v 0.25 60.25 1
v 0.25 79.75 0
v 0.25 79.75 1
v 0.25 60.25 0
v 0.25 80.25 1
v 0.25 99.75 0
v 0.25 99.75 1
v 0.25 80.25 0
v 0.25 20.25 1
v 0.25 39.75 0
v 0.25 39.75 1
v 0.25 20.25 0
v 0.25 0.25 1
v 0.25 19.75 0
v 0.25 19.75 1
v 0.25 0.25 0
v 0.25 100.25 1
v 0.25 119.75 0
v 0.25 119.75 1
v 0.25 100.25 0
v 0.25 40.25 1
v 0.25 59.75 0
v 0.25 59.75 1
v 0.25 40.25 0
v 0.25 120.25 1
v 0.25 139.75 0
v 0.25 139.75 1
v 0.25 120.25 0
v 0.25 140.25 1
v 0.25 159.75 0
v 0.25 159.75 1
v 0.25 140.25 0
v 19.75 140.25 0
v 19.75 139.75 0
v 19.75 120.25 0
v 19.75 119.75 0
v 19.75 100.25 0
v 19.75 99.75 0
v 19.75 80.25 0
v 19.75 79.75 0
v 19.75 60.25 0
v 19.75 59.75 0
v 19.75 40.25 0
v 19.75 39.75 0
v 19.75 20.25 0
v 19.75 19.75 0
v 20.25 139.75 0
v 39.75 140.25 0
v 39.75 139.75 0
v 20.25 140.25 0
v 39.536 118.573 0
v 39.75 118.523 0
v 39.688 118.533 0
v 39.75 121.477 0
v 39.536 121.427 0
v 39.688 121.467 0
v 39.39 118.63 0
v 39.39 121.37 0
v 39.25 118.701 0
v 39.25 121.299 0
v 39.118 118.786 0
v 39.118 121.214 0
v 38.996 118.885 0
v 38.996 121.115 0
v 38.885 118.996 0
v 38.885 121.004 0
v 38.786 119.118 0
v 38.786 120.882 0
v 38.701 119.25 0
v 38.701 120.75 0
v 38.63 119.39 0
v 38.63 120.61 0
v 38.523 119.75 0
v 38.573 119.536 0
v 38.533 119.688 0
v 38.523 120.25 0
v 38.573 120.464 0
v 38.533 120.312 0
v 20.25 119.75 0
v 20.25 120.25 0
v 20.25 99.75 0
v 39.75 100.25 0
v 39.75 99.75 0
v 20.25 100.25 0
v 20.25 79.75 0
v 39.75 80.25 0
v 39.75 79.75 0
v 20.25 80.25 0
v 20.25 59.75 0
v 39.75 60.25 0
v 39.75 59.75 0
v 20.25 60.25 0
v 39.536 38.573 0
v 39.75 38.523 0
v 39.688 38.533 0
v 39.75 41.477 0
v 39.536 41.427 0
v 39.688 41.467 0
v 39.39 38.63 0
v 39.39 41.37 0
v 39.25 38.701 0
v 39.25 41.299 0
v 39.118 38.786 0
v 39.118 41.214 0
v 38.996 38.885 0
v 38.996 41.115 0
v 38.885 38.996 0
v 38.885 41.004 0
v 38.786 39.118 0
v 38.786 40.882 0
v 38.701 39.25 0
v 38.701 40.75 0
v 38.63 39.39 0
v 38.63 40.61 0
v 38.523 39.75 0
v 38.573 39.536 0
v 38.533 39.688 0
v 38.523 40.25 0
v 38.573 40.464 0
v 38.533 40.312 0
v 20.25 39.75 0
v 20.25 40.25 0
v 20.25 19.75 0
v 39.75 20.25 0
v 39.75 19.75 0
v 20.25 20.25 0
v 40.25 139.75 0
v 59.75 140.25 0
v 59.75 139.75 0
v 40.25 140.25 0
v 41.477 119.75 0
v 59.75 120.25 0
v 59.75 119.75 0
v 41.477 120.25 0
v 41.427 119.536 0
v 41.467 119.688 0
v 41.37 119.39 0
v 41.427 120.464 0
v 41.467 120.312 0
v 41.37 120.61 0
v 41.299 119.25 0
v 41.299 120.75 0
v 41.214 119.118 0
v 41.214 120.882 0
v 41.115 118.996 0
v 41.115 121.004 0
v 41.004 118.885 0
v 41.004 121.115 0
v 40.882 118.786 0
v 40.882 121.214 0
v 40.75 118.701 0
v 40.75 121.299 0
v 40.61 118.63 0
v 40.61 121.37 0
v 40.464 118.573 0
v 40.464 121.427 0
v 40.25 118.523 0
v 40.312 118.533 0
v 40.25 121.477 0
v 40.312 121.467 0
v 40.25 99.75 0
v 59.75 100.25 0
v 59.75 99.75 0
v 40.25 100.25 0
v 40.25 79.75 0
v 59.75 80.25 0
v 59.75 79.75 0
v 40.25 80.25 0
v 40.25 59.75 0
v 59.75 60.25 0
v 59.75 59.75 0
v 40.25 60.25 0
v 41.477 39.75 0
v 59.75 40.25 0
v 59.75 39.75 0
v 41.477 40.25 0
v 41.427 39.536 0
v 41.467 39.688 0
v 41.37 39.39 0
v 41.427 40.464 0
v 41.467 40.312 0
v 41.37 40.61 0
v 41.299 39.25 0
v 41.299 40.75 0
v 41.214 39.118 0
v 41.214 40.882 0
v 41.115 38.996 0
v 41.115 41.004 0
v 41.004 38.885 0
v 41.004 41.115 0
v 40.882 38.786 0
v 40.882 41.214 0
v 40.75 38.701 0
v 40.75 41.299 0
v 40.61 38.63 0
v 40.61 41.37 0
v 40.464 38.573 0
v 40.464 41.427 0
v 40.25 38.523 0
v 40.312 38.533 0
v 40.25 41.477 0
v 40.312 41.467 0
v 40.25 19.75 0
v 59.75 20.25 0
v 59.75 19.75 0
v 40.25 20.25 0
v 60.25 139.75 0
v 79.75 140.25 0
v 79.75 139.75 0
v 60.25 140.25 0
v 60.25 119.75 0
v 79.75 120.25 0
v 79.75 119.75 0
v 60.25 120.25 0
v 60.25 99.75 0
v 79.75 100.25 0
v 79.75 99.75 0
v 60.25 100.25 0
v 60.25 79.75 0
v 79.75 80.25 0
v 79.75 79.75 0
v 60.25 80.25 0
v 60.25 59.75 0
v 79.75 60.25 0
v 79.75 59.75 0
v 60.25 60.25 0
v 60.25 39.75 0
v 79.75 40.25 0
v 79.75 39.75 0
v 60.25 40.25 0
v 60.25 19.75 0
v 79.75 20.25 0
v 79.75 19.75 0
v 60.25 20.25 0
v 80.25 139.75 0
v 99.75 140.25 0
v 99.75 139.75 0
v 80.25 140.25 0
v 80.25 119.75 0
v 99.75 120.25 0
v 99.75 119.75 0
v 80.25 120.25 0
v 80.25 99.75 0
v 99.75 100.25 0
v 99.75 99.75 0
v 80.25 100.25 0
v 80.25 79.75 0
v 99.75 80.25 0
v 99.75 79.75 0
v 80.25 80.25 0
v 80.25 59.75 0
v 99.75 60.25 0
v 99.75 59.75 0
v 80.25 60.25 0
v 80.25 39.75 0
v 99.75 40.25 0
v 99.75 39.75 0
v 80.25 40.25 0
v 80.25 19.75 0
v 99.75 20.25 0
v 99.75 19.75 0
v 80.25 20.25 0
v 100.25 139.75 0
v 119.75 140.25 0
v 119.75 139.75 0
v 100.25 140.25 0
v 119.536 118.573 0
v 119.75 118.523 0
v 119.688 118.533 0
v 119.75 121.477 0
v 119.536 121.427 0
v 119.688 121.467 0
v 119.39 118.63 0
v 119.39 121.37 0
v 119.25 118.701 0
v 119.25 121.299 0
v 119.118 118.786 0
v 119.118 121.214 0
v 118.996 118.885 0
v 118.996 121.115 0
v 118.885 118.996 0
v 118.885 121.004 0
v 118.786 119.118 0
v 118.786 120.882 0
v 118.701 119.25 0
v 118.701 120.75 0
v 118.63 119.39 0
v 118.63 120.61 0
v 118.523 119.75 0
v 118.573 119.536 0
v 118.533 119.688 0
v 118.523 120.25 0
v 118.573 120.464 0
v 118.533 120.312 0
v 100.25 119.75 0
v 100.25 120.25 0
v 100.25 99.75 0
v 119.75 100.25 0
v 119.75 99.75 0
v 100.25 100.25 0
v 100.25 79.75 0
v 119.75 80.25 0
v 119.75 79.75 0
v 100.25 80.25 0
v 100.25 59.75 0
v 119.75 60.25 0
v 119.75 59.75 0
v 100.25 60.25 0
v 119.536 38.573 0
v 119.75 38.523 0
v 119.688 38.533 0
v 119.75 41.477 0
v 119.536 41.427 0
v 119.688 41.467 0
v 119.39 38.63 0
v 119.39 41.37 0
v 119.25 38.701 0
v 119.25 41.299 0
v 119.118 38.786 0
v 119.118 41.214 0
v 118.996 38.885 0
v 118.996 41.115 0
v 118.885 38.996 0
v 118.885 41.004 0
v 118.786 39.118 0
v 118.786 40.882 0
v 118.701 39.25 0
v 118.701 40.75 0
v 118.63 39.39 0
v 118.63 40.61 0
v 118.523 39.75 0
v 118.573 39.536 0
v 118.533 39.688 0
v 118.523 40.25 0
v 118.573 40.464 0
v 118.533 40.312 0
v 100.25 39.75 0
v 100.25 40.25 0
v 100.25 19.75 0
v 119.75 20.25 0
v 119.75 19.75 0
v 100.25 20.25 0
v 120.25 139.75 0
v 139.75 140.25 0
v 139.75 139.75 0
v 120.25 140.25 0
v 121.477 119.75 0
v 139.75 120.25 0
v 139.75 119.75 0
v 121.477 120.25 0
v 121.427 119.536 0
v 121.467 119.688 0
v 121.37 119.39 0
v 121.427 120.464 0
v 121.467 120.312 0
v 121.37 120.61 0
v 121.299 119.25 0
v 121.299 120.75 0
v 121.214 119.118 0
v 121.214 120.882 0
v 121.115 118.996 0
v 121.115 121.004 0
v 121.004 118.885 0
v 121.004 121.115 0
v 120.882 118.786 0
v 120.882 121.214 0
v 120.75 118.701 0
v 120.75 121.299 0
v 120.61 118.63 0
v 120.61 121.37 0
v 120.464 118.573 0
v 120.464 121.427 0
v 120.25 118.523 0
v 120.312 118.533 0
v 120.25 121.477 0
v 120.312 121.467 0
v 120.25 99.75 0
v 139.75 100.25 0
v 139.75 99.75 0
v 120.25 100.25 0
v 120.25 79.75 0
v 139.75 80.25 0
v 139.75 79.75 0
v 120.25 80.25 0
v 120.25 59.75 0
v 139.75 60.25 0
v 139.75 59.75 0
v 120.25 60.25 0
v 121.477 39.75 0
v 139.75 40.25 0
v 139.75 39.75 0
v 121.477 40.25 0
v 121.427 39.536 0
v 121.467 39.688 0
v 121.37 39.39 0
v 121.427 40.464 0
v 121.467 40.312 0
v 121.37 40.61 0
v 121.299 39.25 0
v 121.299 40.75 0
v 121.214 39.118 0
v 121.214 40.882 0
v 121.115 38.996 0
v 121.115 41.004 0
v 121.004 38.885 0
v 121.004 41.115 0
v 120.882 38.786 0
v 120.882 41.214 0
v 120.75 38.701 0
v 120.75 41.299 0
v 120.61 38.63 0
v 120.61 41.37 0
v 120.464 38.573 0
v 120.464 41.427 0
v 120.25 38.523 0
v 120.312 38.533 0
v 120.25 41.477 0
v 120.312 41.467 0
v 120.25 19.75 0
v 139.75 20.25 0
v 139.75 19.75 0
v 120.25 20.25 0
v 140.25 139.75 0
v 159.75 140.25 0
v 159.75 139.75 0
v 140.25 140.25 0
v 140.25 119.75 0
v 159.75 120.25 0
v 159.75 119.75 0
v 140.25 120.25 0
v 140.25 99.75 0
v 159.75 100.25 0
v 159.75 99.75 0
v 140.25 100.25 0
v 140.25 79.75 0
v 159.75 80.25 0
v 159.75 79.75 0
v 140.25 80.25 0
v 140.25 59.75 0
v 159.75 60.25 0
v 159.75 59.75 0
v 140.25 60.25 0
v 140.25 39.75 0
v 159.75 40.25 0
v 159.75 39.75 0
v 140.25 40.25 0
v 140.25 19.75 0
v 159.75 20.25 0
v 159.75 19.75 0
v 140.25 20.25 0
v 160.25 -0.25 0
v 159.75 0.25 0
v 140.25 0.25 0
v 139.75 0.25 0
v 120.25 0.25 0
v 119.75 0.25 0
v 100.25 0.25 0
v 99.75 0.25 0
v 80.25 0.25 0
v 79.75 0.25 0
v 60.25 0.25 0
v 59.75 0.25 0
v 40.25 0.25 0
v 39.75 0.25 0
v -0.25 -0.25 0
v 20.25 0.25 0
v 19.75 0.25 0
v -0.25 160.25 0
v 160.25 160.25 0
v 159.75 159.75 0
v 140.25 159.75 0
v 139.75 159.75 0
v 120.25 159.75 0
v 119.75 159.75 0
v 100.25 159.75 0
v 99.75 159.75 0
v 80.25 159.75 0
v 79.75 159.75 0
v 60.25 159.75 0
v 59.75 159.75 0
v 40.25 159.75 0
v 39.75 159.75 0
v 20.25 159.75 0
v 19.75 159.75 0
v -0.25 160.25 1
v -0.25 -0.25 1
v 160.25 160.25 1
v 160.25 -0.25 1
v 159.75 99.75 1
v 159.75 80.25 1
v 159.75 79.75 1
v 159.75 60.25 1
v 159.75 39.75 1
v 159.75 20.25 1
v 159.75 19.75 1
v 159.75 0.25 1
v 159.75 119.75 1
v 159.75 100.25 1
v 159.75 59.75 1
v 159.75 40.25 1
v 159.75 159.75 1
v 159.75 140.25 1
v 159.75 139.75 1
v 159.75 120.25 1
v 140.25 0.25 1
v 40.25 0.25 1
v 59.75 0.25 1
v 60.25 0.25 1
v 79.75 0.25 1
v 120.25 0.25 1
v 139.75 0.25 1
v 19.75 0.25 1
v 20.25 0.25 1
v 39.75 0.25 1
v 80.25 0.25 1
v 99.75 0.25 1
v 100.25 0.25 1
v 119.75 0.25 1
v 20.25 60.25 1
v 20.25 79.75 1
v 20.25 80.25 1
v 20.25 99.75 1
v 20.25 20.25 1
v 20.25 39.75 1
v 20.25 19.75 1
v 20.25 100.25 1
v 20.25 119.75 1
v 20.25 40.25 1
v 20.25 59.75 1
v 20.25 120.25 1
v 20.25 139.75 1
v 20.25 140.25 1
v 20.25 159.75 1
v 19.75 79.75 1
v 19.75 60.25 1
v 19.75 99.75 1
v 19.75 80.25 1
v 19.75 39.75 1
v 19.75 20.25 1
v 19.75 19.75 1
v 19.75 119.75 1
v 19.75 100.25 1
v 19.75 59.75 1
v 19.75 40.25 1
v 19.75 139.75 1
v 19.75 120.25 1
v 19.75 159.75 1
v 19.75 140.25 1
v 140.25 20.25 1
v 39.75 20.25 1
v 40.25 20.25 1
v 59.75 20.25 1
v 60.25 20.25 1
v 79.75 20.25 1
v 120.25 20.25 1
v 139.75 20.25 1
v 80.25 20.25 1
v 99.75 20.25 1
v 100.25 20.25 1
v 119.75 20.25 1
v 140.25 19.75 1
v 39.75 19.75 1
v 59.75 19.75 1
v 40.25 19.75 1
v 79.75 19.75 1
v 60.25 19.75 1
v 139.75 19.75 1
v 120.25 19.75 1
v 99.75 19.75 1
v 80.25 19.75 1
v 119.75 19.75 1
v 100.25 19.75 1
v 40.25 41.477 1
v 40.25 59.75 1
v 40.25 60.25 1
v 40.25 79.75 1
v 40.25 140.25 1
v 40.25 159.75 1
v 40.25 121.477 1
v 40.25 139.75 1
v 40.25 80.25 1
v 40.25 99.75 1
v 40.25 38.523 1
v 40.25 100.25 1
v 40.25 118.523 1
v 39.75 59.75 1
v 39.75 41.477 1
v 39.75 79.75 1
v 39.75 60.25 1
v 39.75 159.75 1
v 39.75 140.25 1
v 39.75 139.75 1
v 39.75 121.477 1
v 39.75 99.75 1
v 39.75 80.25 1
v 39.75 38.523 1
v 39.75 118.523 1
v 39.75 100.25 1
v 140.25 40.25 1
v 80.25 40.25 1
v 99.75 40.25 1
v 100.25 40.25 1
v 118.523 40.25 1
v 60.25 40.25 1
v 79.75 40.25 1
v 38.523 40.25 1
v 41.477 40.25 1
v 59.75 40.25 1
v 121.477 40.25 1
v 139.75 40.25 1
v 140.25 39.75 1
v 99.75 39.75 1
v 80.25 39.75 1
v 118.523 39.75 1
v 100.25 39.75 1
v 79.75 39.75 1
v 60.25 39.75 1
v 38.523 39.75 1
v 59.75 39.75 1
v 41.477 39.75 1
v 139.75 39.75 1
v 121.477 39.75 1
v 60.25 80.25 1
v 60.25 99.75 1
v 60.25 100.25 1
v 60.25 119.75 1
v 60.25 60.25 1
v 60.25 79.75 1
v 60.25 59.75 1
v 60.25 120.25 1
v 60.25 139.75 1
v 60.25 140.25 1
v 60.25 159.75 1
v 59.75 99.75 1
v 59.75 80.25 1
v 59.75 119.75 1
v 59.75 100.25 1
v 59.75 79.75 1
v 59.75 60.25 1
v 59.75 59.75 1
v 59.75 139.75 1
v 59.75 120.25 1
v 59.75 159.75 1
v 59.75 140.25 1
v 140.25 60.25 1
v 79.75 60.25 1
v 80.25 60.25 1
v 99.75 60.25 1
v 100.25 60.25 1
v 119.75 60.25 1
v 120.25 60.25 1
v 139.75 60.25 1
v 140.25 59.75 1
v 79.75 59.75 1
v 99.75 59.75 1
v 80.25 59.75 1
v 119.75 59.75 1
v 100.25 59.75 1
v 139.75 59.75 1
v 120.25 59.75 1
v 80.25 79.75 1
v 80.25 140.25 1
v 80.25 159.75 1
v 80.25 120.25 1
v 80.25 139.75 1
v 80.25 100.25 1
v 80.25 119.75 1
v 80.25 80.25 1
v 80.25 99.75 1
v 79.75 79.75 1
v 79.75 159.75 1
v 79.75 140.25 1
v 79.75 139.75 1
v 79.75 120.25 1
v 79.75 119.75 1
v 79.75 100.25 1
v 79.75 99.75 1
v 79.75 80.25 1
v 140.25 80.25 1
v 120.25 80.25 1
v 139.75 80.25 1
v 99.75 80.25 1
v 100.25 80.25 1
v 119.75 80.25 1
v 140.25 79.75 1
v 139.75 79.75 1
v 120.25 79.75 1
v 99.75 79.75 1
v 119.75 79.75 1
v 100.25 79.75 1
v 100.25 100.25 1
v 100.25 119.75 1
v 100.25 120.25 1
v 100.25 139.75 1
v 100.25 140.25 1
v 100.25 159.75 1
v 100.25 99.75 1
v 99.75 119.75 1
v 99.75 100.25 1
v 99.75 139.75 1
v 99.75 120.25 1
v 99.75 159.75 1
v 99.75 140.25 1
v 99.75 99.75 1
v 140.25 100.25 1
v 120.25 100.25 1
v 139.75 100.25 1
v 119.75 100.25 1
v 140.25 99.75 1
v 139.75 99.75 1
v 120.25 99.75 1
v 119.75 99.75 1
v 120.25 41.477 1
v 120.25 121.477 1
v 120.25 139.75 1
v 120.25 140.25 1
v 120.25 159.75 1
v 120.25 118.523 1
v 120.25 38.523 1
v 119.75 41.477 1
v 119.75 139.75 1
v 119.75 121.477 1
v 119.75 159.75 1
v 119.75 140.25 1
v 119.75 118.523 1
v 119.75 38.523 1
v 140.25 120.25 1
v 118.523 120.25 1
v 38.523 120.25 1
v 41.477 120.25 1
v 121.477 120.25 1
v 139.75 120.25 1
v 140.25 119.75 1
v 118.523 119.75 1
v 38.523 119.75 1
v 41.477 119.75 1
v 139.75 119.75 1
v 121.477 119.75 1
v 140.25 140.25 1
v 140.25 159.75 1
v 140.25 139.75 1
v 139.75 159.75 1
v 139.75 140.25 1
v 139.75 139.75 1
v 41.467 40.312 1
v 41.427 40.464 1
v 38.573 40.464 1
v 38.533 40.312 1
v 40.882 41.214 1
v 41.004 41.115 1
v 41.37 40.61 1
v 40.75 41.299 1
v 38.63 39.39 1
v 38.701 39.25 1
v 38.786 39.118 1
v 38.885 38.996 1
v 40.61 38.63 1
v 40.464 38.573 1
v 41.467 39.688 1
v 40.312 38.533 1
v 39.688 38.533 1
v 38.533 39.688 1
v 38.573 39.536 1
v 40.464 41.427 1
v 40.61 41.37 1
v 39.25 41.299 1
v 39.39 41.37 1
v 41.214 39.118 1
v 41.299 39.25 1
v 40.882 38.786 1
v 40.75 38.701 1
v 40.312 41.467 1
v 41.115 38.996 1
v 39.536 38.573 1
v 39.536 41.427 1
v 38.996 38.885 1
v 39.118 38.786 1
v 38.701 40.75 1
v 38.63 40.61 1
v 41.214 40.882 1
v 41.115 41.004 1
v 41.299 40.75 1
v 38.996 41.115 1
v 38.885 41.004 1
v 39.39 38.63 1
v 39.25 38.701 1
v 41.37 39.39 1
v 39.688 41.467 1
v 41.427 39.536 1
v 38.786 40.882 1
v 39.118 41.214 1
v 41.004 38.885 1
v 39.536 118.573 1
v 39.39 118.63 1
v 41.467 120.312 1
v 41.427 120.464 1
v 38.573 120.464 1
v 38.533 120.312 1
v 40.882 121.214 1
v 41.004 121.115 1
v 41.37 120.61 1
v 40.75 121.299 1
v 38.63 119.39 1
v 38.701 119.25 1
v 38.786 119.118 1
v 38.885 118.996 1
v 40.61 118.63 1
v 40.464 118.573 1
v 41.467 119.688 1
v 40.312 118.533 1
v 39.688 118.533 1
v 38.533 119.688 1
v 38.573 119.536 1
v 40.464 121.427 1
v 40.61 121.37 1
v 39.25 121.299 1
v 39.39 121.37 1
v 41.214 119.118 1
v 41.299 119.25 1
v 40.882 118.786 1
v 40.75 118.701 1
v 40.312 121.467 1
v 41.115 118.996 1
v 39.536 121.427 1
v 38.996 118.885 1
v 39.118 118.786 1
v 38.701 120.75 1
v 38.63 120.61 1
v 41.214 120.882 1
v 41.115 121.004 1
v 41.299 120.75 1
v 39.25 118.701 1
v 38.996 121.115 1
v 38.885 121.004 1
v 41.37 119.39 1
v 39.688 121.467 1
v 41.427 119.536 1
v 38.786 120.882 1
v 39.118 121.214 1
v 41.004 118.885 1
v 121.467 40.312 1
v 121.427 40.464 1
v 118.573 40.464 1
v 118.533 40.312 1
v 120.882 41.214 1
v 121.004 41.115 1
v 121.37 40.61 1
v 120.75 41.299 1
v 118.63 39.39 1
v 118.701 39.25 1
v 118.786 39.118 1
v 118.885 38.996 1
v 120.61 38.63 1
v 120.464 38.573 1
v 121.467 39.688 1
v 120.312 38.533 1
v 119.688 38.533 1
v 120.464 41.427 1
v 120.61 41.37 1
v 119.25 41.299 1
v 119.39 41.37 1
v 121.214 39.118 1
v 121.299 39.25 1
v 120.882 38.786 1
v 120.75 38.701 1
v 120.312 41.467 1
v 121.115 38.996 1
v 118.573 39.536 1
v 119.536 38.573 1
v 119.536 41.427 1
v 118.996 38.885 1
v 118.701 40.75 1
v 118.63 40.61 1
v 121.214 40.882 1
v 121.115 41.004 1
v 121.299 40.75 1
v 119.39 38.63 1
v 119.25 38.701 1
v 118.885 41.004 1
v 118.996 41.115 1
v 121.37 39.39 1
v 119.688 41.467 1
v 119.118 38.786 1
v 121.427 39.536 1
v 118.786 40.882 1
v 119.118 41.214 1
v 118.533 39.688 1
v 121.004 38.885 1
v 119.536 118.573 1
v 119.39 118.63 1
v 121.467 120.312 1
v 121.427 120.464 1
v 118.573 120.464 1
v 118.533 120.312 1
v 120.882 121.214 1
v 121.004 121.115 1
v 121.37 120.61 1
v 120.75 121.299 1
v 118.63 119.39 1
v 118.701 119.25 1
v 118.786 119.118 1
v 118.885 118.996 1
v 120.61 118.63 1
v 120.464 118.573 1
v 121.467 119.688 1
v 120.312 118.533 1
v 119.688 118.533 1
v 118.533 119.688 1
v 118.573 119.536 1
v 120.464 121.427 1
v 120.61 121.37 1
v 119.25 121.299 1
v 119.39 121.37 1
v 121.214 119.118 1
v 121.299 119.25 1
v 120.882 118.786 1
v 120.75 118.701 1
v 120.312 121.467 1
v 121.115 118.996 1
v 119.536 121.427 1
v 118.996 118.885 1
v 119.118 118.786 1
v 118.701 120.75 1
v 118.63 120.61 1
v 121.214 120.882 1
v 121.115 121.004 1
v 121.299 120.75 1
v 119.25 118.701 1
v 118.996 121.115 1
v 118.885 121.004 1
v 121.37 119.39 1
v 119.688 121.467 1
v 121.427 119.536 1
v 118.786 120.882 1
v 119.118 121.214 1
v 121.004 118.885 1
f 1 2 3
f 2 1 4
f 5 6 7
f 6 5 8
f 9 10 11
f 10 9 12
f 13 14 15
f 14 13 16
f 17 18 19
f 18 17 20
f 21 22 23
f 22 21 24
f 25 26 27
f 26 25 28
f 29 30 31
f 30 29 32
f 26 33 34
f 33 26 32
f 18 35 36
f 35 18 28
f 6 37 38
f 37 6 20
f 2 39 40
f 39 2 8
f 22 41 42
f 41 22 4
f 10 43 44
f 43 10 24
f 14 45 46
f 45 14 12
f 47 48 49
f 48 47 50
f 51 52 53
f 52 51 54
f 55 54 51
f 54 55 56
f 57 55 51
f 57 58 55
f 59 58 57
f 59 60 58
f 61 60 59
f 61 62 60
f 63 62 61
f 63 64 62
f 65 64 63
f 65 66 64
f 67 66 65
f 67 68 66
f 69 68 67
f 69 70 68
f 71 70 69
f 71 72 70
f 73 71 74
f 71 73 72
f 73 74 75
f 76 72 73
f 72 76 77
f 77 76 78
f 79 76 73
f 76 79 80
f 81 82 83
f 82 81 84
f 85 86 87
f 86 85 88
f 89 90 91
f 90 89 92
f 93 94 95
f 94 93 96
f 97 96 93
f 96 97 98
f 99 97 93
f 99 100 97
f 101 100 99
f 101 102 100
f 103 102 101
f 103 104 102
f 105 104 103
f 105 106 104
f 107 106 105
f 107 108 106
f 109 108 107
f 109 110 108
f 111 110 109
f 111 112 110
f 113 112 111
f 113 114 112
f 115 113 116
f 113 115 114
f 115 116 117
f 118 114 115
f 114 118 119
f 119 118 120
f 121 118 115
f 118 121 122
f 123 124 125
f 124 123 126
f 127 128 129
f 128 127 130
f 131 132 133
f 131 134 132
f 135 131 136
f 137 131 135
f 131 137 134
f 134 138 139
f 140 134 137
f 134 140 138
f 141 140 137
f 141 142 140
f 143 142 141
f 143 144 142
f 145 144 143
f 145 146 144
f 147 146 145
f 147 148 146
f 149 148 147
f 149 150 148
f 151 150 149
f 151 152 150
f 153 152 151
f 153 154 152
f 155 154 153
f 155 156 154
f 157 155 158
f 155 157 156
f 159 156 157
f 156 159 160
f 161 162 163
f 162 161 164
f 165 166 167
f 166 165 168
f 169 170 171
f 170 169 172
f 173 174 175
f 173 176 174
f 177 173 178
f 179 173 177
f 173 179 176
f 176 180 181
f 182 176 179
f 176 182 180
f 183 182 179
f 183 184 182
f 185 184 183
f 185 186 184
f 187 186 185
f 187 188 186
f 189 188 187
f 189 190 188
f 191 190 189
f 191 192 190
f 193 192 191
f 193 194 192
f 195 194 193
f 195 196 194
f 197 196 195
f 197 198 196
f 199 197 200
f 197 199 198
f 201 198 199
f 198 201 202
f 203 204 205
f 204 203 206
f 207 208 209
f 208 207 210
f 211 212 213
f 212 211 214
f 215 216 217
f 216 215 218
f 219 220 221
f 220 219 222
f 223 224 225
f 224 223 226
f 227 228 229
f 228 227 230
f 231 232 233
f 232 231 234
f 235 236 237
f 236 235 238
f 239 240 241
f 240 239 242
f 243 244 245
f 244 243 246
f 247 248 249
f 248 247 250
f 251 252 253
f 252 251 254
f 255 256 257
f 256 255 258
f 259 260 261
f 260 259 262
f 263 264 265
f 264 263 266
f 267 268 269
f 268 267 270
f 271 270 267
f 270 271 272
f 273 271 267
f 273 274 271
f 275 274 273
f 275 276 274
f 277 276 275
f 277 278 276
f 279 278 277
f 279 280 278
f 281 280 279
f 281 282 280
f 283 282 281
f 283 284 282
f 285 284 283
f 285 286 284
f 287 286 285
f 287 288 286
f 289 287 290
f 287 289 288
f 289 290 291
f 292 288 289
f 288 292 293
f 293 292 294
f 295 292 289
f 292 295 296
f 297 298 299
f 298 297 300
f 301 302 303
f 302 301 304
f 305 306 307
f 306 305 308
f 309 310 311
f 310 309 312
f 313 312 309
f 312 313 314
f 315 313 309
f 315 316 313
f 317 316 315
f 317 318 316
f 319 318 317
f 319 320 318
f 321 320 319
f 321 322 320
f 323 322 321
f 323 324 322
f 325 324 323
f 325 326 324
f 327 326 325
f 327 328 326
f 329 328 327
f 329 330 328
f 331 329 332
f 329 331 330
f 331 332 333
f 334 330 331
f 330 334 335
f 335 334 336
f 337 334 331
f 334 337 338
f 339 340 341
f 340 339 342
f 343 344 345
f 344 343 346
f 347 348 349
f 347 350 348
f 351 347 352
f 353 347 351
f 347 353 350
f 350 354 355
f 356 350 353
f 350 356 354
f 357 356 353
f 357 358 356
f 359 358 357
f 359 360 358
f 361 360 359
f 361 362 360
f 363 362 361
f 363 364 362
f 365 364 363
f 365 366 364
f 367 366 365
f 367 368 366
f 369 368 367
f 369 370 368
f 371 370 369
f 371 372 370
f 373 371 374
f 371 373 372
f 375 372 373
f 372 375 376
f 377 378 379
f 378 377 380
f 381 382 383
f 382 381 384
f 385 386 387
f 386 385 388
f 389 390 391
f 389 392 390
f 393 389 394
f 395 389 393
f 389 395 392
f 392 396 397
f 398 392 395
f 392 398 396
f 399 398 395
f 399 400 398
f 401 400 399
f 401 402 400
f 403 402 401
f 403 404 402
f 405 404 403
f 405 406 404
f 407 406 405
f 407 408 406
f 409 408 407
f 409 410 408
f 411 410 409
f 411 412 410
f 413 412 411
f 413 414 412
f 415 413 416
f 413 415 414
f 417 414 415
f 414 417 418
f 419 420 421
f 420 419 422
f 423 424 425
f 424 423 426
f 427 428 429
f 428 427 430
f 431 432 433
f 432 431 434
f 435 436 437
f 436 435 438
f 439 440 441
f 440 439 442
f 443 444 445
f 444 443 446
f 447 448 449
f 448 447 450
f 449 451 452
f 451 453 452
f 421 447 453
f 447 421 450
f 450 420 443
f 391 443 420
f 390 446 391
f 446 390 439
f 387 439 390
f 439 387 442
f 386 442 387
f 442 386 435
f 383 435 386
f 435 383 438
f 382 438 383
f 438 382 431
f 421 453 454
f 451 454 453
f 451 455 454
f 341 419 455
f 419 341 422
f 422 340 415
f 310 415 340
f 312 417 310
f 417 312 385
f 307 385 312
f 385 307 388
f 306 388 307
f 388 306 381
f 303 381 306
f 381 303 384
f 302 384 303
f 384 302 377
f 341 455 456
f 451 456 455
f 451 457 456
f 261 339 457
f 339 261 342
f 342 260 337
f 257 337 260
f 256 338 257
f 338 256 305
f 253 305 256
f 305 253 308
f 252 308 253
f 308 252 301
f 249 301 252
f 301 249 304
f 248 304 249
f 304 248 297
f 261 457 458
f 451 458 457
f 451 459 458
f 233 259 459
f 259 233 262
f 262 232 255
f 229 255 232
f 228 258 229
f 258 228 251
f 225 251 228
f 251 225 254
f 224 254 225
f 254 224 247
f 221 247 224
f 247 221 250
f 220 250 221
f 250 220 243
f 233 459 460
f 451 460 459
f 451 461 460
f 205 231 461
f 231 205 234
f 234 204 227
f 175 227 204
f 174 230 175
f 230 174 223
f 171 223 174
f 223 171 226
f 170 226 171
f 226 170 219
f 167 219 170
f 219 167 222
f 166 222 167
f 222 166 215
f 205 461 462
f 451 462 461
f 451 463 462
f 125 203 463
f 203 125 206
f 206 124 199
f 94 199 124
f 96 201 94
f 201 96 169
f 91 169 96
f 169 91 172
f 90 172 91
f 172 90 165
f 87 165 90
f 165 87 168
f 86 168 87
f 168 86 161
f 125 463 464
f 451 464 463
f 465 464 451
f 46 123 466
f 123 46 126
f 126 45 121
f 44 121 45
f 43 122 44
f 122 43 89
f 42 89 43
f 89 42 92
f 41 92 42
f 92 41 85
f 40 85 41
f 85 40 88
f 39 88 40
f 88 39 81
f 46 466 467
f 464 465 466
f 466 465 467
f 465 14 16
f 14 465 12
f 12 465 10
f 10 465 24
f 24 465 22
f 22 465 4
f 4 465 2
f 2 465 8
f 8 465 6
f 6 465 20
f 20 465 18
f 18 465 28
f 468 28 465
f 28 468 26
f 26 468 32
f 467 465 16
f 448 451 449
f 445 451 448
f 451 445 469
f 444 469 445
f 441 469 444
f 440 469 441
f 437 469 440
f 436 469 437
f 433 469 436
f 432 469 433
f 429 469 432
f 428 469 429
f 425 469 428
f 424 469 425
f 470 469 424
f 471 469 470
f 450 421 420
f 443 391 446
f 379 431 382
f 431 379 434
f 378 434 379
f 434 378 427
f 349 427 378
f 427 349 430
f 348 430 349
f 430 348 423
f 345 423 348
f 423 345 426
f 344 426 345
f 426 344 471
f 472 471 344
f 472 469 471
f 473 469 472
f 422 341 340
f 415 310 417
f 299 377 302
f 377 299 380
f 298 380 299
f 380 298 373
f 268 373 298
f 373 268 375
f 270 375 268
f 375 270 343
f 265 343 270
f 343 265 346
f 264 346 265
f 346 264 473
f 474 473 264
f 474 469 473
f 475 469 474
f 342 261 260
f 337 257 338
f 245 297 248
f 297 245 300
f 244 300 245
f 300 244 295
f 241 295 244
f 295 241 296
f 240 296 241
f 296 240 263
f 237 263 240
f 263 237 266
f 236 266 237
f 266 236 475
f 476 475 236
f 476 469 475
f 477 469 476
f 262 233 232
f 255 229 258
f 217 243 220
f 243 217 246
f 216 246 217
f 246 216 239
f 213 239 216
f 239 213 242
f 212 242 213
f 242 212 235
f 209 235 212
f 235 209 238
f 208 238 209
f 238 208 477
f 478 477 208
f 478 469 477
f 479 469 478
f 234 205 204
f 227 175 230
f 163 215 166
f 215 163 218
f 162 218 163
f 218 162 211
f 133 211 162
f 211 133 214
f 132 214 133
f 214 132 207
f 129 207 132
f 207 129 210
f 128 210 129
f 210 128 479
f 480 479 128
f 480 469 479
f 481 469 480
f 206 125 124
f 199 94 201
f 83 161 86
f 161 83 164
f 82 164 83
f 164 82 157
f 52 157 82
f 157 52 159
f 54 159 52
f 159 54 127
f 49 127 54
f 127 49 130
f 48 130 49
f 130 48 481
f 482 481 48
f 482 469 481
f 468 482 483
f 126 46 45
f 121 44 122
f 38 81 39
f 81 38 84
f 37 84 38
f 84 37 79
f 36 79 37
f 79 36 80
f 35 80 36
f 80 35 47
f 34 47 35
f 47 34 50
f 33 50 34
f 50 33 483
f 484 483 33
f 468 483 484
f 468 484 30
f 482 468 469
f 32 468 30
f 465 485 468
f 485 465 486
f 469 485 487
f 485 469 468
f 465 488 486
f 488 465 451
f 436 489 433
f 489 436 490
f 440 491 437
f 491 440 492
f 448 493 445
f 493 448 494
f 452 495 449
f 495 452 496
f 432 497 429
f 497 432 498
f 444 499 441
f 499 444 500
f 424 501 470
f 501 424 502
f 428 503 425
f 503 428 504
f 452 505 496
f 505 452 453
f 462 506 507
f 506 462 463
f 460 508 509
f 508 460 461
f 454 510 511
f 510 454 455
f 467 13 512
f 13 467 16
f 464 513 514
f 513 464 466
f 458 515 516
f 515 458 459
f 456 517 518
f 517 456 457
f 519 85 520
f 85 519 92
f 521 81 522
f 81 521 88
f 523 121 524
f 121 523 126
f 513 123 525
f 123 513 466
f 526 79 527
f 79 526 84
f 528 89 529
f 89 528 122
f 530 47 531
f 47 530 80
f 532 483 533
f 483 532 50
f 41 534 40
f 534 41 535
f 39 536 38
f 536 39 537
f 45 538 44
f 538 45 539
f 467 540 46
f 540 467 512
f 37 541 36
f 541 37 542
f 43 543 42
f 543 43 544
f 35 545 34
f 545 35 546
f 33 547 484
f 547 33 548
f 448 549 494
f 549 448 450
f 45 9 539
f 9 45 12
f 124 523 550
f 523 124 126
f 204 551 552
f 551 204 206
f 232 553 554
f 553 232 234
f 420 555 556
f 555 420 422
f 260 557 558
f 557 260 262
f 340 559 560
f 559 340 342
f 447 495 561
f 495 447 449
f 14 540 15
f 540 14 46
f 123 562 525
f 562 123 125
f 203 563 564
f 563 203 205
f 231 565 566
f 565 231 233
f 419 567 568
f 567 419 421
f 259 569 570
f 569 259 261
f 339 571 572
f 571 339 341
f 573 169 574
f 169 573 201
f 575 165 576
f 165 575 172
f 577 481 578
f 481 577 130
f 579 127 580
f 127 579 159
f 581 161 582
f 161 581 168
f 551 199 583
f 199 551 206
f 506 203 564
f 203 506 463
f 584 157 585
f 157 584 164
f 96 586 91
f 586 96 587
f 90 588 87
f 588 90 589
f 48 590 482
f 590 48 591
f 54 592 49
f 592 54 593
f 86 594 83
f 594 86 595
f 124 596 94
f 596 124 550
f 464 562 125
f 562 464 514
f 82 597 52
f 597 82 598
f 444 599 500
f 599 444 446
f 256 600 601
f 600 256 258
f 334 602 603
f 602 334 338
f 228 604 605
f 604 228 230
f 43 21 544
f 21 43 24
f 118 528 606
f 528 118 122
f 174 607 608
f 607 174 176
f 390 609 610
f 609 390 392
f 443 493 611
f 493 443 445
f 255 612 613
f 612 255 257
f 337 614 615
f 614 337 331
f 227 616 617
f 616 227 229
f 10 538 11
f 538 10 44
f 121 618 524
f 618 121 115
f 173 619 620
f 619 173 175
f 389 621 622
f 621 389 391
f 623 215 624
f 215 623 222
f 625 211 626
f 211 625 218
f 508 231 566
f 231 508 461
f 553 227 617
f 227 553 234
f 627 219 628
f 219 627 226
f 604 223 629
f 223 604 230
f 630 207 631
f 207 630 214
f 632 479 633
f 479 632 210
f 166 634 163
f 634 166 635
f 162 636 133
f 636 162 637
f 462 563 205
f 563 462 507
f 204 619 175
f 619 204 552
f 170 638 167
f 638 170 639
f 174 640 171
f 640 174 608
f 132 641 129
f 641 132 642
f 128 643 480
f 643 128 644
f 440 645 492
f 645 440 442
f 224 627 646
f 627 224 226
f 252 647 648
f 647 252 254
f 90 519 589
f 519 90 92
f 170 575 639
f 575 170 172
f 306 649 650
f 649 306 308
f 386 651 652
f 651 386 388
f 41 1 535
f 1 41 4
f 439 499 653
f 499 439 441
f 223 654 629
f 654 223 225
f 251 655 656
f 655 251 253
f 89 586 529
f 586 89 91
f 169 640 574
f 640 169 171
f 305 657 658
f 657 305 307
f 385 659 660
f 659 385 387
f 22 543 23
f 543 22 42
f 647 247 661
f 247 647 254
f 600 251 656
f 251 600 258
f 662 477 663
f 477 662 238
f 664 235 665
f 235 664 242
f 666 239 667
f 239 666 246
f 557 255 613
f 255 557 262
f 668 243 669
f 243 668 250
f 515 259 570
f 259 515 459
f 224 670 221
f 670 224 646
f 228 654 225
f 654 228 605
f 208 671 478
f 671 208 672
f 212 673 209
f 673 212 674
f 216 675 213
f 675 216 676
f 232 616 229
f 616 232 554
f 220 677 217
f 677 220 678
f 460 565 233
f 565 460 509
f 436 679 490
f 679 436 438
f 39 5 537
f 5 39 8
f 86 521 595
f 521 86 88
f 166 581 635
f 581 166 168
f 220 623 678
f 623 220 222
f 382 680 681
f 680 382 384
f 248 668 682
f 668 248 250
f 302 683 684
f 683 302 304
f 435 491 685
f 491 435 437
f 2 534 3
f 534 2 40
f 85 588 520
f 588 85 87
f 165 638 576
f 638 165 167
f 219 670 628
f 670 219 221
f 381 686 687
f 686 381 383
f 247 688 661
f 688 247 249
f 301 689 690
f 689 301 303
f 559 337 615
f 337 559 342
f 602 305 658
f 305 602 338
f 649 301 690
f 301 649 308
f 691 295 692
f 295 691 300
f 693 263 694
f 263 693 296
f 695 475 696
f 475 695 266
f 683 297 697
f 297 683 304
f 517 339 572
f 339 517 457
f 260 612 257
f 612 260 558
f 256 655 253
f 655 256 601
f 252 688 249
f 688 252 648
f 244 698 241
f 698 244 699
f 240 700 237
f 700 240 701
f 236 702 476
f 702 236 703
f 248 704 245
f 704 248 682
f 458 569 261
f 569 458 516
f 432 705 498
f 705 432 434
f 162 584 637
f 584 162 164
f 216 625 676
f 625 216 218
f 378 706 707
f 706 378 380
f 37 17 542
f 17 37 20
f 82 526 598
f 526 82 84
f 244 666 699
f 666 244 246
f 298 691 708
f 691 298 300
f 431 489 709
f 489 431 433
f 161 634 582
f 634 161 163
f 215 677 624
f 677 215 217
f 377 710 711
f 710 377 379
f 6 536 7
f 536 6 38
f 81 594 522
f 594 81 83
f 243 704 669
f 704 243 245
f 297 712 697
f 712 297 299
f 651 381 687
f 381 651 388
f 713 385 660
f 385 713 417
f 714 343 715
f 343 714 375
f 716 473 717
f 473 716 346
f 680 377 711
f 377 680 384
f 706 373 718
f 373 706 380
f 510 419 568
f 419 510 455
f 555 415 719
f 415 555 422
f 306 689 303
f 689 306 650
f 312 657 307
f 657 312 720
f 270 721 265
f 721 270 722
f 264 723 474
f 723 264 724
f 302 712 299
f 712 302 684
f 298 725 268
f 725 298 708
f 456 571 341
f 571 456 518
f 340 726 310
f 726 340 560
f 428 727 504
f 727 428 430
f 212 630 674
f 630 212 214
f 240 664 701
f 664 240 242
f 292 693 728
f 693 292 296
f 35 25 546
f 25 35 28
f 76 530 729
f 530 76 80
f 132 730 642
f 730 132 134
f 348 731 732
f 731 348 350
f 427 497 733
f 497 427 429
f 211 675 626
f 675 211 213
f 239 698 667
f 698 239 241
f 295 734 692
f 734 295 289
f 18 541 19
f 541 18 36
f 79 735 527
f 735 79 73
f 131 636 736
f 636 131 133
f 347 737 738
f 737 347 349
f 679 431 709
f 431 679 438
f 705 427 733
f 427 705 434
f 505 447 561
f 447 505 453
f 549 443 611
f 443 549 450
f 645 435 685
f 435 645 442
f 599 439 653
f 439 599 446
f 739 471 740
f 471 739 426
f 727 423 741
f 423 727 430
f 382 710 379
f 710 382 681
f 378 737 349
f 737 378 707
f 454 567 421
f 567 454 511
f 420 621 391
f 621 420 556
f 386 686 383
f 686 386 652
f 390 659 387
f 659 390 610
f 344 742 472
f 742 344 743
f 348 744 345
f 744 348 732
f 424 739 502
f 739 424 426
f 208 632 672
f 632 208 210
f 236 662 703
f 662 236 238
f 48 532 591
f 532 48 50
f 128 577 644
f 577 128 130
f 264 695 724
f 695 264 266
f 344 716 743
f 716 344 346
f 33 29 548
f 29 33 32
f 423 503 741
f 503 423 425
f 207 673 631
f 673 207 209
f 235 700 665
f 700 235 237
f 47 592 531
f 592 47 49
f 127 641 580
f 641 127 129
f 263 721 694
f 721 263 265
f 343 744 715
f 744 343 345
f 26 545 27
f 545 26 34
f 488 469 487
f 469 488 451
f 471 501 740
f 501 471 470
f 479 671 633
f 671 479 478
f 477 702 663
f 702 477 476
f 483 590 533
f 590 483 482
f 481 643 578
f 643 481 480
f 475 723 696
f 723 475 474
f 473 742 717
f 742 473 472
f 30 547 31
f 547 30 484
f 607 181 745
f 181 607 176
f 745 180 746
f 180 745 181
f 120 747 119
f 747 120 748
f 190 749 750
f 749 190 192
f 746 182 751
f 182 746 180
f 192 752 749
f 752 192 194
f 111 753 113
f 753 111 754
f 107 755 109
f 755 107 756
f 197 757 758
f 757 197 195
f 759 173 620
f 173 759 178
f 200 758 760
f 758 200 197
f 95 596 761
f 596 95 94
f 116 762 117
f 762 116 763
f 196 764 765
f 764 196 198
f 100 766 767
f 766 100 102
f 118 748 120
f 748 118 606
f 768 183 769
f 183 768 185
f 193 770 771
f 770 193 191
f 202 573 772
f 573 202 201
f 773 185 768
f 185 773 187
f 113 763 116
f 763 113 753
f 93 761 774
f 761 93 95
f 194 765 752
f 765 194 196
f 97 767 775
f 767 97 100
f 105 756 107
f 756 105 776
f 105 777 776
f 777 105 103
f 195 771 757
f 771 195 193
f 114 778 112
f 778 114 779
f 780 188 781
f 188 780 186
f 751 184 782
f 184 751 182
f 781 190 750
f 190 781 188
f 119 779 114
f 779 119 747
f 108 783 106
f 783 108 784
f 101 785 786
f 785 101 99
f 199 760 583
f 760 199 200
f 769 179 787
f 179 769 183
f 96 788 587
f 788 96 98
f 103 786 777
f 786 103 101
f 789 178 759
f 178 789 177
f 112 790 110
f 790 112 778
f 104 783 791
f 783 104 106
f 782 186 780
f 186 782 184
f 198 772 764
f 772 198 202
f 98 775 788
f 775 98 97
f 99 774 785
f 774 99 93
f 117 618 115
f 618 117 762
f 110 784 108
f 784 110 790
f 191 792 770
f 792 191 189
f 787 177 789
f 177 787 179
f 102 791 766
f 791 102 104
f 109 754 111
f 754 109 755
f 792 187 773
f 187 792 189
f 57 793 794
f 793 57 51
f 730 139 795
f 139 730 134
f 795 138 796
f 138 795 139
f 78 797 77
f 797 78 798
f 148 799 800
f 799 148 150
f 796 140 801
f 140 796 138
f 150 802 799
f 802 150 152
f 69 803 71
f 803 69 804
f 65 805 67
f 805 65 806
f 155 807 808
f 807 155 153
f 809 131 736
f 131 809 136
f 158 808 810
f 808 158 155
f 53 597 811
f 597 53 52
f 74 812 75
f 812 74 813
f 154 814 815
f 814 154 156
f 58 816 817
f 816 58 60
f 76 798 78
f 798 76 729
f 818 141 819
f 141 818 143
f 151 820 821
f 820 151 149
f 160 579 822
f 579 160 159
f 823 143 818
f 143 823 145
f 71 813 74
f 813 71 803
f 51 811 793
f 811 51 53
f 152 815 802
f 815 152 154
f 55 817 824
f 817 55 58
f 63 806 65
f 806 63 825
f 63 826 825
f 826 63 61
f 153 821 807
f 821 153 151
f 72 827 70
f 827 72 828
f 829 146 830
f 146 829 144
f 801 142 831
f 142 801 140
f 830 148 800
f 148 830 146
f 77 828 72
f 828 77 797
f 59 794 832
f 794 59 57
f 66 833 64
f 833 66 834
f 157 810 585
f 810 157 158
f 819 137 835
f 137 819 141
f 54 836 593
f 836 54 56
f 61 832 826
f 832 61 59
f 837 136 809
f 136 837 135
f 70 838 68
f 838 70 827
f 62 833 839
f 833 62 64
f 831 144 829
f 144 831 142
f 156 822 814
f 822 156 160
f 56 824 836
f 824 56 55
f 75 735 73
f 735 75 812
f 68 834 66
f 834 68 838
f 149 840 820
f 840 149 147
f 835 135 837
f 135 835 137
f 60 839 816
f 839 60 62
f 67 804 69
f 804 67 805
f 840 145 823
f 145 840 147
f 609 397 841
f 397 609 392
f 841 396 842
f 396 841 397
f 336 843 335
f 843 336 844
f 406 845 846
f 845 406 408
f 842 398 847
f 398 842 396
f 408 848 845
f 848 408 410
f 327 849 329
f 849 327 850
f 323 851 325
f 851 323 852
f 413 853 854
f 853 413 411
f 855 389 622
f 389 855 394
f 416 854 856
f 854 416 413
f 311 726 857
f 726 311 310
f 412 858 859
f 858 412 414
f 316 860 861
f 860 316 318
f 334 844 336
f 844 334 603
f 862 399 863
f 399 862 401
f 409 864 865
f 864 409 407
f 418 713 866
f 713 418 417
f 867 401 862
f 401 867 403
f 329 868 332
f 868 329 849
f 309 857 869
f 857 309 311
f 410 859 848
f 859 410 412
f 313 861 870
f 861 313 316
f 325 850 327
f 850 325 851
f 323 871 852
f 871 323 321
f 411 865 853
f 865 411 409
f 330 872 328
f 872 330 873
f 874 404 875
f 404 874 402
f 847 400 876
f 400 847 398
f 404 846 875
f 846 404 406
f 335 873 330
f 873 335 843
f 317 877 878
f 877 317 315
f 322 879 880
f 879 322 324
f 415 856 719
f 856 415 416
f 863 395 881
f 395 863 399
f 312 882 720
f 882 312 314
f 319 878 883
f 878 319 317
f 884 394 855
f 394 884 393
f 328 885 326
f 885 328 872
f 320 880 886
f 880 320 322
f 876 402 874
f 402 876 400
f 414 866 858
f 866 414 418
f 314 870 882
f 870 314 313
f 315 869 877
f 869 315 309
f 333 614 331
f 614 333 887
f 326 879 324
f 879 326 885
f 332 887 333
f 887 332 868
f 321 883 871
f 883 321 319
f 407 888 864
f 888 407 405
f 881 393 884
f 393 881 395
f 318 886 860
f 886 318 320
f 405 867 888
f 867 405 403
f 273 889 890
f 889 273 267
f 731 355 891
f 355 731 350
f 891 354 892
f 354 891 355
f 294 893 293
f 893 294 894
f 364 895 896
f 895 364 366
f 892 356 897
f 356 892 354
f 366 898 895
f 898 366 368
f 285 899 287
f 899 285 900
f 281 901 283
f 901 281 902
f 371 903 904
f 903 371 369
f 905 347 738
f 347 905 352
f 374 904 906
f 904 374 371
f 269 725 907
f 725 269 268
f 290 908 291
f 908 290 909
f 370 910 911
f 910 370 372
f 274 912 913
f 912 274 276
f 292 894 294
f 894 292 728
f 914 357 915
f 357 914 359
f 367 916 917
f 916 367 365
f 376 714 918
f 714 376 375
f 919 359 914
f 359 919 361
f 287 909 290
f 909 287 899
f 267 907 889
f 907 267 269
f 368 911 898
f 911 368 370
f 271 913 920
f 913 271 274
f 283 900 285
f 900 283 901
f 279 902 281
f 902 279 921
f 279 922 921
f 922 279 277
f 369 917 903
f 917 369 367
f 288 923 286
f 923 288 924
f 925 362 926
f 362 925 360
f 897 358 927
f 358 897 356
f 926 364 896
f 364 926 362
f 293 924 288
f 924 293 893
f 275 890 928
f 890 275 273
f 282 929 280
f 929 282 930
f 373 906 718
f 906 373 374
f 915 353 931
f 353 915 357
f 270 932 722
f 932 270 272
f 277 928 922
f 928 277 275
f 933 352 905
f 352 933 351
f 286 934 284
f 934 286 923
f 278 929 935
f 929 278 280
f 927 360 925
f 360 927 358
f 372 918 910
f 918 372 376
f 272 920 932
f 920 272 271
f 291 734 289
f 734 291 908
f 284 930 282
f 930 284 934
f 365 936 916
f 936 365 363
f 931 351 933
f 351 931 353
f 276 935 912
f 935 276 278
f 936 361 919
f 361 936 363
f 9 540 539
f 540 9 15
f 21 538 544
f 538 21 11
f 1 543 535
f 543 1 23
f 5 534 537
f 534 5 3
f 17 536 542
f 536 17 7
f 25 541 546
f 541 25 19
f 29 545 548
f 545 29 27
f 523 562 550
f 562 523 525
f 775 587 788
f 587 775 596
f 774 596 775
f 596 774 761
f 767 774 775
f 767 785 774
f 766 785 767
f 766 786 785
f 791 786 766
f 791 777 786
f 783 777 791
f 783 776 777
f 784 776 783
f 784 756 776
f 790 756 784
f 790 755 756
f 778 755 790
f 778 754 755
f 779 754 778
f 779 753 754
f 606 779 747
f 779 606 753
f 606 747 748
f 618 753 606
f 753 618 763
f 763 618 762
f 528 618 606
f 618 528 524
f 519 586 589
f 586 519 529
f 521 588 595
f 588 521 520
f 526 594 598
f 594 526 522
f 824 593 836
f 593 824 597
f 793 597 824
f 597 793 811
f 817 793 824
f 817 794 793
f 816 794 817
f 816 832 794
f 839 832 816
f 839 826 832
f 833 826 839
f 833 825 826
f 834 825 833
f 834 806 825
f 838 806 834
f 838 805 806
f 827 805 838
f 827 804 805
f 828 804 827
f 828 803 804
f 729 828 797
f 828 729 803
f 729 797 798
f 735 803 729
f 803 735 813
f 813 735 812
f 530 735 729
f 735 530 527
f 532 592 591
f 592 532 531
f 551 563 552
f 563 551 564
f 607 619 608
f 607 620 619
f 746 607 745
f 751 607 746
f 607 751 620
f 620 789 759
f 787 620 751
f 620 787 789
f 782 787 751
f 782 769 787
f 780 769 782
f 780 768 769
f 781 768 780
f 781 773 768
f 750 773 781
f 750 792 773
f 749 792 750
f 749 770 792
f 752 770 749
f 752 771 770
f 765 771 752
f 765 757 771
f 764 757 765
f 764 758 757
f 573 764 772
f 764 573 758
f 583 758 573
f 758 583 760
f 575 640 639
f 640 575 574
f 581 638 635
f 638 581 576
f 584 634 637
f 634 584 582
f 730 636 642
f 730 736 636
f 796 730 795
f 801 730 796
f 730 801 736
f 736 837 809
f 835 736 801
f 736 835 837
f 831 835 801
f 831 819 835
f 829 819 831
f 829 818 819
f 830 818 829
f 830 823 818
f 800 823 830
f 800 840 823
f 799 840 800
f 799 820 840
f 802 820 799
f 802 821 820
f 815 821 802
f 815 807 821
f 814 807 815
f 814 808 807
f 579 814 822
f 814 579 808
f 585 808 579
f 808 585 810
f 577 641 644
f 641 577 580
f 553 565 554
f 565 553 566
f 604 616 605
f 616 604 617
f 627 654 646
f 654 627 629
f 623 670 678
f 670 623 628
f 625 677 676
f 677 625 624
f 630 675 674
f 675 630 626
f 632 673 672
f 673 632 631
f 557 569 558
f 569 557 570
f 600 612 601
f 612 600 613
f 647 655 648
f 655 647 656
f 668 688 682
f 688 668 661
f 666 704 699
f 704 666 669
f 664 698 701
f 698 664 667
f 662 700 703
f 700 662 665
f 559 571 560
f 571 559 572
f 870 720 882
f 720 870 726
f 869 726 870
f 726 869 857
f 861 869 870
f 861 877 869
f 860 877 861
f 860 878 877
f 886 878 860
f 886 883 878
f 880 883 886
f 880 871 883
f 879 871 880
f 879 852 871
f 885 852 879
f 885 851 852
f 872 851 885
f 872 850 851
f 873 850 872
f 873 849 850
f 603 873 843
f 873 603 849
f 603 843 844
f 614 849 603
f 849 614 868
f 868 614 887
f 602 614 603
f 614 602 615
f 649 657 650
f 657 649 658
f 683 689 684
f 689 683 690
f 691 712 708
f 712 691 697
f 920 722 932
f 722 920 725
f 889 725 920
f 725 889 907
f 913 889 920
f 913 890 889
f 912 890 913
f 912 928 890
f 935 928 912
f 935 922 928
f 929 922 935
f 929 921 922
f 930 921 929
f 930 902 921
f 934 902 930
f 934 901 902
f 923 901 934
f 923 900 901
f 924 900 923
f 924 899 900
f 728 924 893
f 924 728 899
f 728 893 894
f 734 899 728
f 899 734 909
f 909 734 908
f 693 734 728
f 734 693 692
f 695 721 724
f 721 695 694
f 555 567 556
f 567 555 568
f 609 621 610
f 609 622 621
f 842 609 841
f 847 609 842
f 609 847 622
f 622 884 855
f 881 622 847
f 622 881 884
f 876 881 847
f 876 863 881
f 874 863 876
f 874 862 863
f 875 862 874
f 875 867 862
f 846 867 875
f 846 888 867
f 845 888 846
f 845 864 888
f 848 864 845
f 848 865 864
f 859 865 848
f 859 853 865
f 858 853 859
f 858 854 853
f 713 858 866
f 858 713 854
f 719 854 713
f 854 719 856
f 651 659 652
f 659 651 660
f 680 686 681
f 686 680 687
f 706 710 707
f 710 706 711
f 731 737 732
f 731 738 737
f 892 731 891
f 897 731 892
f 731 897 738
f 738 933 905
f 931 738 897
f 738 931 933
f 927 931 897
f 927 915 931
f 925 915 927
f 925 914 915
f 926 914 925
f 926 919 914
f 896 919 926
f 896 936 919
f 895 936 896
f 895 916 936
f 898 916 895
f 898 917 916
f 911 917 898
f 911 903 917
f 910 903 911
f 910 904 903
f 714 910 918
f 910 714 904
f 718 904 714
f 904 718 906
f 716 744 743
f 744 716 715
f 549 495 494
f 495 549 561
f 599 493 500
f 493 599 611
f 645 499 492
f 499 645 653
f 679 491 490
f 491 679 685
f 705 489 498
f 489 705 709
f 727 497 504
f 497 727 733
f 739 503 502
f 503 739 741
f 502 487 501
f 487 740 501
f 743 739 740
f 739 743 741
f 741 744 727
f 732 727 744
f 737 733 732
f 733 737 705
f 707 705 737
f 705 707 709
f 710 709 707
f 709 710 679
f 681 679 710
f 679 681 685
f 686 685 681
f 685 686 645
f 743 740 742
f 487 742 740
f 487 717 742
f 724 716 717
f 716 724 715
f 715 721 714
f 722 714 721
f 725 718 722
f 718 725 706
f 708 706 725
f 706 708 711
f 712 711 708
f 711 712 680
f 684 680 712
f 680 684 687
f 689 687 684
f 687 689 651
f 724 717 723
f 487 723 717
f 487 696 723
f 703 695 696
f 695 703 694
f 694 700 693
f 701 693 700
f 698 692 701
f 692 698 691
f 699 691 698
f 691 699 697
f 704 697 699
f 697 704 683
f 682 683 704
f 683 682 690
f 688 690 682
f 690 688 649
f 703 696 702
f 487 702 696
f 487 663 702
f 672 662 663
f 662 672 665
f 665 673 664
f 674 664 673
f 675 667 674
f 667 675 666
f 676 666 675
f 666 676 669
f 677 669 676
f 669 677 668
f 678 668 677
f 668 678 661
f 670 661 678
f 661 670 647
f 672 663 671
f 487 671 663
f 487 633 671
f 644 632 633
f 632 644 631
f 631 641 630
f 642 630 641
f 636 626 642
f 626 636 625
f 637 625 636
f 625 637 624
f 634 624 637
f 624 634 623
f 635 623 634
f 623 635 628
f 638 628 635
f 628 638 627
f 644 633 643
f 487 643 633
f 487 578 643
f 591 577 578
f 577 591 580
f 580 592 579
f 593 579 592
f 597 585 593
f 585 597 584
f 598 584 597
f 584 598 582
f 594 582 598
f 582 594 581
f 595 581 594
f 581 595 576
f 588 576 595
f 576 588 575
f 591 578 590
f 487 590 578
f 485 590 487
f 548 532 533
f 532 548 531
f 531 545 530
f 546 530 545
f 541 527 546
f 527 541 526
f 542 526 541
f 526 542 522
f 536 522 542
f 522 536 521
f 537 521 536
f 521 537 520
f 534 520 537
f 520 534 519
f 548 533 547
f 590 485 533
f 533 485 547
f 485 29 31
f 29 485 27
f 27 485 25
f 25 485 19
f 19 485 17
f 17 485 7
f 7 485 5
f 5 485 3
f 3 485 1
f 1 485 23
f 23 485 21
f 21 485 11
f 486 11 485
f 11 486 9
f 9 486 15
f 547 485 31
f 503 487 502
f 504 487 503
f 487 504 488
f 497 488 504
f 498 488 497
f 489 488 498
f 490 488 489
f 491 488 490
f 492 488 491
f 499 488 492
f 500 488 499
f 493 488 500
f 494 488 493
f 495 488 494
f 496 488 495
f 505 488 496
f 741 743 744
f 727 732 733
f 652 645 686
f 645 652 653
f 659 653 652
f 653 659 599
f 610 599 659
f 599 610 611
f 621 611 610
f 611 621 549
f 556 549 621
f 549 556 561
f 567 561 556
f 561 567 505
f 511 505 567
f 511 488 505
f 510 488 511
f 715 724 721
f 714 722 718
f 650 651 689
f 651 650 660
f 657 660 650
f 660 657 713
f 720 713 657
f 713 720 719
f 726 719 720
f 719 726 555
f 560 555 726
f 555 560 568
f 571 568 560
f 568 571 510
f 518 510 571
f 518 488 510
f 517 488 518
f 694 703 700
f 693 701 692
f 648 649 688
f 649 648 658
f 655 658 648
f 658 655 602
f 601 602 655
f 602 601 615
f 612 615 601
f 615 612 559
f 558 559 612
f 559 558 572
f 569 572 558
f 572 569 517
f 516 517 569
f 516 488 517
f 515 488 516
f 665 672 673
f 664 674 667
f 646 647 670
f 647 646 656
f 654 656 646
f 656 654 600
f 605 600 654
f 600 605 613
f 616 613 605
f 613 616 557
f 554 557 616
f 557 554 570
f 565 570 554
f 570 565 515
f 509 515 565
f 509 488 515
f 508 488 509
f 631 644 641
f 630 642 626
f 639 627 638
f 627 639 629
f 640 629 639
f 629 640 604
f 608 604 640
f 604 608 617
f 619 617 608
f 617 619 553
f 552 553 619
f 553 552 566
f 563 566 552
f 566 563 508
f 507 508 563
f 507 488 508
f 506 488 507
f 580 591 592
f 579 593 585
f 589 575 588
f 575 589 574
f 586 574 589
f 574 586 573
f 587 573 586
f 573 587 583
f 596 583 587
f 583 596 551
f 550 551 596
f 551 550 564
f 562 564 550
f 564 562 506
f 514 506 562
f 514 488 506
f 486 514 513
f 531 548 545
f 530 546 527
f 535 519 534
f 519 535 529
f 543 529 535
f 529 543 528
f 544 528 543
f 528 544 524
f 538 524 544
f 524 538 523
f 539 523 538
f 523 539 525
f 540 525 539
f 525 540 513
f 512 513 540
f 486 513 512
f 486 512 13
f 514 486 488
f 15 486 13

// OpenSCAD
$fn = $preview ? 20 : 60;
difference() {
	union() {
		union() {
			translate(v = [-0.25, -0.25, 0]) {
				cube(size = [0.5, 160.5, 20]);
			}
			translate(v = [-0.25, -0.25, 0]) {
				cube(size = [160, 0.5, 20]);
			}
			translate(v = [19.75, -0.25, 0]) {
				cube(size = [0.5, 160.5, 20]);
			}
			translate(v = [-0.25, 19.75, 0]) {
				cube(size = [160, 0.5, 20]);
			}
			translate(v = [39.75, -0.25, 0]) {
				cube(size = [0.5, 160.5, 20]);
			}
			translate(v = [-0.25, 39.75, 0]) {
				cube(size = [160, 0.5, 20]);
			}
			translate(v = [59.75, -0.25, 0]) {
				cube(size = [0.5, 160.5, 20]);
			}
			translate(v = [-0.25, 59.75, 0]) {
				cube(size = [160, 0.5, 20]);
			}
			translate(v = [79.75, -0.25, 0]) {
				cube(size = [0.5, 160.5, 20]);
			}
			translate(v = [-0.25, 79.75, 0]) {
				cube(size = [160, 0.5, 20]);
			}
			translate(v = [99.75, -0.25, 0]) {
				cube(size = [0.5, 160.5, 20]);
			}
			translate(v = [-0.25, 99.75, 0]) {
				cube(size = [160, 0.5, 20]);
			}
			translate(v = [119.75, -0.25, 0]) {
				cube(size = [0.5, 160.5, 20]);
			}
			translate(v = [-0.25, 119.75, 0]) {
				cube(size = [160, 0.5, 20]);
			}
			translate(v = [139.75, -0.25, 0]) {
				cube(size = [0.5, 160.5, 20]);
			}
			translate(v = [-0.25, 139.75, 0]) {
				cube(size = [160, 0.5, 20]);
			}
			translate(v = [159.75, -0.25, 0]) {
				cube(size = [0.5, 160.5, 20]);
			}
			translate(v = [-0.25, 159.75, 0]) {
				cube(size = [160, 0.5, 20]);
			}
		}
		union() {
			translate(v = [40, 40, 0]) {
				cylinder(h = 20, r1 = 1.5, r2 = 1.5);
			}
			translate(v = [40, 120, 0]) {
				cylinder(h = 20, r1 = 1.5, r2 = 1.5);
			}
			translate(v = [120, 40, 0]) {
				cylinder(h = 20, r1 = 1.5, r2 = 1.5);
			}
			translate(v = [120, 120, 0]) {
				cylinder(h = 20, r1 = 1.5, r2 = 1.5);
			}
		}
	}
	translate(v = [-10, -10, 1.0]) {
		cube(size = [500, 500, 500]);
	}
}
